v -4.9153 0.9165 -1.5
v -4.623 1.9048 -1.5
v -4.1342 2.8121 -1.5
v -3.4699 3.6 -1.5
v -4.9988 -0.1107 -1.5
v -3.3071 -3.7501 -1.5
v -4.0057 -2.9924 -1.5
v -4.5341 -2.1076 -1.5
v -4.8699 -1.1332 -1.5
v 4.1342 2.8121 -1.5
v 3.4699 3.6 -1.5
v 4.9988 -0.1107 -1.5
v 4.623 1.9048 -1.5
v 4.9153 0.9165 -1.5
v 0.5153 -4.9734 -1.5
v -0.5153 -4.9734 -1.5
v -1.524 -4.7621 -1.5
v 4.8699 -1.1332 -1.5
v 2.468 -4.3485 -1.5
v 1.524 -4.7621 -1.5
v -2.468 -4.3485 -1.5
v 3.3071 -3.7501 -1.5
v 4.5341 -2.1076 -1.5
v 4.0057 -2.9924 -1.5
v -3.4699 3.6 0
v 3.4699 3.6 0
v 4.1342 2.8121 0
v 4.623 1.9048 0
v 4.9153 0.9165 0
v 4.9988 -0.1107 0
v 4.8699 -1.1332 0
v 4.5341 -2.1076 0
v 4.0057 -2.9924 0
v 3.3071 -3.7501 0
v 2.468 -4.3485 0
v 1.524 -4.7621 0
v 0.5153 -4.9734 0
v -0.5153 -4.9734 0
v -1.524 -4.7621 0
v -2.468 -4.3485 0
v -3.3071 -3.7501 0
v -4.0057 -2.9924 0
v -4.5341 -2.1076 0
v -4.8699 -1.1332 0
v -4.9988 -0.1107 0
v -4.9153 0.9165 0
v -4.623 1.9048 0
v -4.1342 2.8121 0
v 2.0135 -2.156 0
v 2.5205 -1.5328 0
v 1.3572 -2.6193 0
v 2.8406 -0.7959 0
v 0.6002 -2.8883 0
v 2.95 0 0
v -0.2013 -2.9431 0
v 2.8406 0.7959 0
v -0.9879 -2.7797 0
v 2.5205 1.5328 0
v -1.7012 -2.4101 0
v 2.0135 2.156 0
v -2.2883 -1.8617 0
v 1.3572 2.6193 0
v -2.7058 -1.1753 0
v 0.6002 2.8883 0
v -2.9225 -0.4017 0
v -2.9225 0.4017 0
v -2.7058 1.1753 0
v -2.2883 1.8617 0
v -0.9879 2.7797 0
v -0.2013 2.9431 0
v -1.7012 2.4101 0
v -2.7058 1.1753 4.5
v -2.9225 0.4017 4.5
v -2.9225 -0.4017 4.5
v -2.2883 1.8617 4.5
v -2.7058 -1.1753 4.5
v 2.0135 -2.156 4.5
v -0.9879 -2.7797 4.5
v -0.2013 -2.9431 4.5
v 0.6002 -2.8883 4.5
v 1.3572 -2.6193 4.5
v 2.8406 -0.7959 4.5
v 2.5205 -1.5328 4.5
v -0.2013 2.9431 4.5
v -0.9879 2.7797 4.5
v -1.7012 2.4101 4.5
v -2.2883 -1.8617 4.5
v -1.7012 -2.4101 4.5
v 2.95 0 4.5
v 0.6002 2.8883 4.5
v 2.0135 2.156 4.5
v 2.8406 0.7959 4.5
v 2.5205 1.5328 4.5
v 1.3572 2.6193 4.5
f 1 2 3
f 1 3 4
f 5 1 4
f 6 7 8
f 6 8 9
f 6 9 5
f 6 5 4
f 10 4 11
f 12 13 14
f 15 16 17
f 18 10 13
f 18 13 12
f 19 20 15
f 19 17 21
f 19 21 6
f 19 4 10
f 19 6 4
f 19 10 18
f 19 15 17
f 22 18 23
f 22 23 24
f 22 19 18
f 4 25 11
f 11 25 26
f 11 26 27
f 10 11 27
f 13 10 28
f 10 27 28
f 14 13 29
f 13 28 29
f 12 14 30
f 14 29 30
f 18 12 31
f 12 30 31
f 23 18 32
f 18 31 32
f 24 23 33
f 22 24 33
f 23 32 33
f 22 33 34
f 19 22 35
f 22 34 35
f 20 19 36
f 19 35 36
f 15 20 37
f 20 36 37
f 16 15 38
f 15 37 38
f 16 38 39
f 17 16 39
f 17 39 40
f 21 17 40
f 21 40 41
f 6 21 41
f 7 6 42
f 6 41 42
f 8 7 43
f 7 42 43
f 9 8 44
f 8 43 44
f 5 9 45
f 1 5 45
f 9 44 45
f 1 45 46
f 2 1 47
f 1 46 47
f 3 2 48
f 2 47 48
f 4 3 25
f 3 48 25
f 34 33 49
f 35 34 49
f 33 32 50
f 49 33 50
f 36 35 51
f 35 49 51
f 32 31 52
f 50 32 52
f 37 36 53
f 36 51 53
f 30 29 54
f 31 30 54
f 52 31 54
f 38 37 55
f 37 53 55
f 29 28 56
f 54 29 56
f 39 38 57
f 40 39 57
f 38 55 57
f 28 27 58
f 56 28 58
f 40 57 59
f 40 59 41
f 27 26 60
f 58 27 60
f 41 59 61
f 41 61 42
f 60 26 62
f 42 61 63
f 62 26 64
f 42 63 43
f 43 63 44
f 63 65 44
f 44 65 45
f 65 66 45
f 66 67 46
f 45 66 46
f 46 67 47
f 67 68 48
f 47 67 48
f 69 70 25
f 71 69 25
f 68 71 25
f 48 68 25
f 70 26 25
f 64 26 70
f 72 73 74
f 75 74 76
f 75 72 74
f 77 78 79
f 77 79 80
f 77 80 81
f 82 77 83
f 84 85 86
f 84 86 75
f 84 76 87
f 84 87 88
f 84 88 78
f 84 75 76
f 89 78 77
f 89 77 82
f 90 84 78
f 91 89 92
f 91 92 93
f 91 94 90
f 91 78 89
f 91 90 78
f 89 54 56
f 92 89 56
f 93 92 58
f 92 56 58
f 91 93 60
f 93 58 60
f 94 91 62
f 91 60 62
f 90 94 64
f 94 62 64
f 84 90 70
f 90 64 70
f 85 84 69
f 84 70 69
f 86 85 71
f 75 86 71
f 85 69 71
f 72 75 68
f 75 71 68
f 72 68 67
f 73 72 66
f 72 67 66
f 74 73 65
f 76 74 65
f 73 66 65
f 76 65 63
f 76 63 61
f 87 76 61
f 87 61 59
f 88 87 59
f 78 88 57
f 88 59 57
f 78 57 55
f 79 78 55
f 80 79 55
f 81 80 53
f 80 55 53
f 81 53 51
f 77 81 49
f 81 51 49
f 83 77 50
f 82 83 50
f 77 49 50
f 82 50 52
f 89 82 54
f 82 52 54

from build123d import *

# Parameters (mm, degrees)
SKETCH1_R           = 2.95
BOSS_EXTRUDE1_DEPTH = 4.5
SKETCH1_5_R         = 2.95
BOSS_EXTRUDE2_DEPTH = 1.5
BOSS_EXTRUDE3_START = 1.5
SKETCH3_R           = 2.95
BOSS_EXTRUDE3_DEPTH = 1.5


with BuildPart() as part:
    # Sketch1 → Boss-Extrude1 (new body)
    with BuildSketch(Plane.XY):
        Circle(SKETCH1_R)
    extrude(amount=BOSS_EXTRUDE1_DEPTH)


with BuildPart() as body_2:
    # Sketch1<5> → Boss-Extrude2 (new body)
    with BuildSketch(Plane.XY):
        with BuildLine():
            Line((-3.469870315, 3.6), (3.469870315, 3.6))
            ThreePointArc((3.469870315, 3.6), (0, -5), (-3.469870315, 3.6))
        make_face()
        Circle(SKETCH1_5_R, mode=Mode.SUBTRACT)
    extrude(amount=-BOSS_EXTRUDE2_DEPTH)


with BuildPart() as boss_extrude3_tool:
    # Sketch3 → Boss-Extrude3 (new body)
    with BuildSketch(Plane(origin=(0, 0, 0), x_dir=(-1, 0, 0), z_dir=(0, 0, -1)).offset(BOSS_EXTRUDE3_START)):
        Circle(SKETCH3_R)
    extrude(amount=-BOSS_EXTRUDE3_DEPTH)


with BuildPart() as part_1:
    add(part.part)


with BuildPart() as part_2:
    # Boss-Extrude3: joined with boss_extrude3_tool
    add(part_1.part.fuse(boss_extrude3_tool.part, body_2.part, tol=0.00001))


solid = part_2.part
